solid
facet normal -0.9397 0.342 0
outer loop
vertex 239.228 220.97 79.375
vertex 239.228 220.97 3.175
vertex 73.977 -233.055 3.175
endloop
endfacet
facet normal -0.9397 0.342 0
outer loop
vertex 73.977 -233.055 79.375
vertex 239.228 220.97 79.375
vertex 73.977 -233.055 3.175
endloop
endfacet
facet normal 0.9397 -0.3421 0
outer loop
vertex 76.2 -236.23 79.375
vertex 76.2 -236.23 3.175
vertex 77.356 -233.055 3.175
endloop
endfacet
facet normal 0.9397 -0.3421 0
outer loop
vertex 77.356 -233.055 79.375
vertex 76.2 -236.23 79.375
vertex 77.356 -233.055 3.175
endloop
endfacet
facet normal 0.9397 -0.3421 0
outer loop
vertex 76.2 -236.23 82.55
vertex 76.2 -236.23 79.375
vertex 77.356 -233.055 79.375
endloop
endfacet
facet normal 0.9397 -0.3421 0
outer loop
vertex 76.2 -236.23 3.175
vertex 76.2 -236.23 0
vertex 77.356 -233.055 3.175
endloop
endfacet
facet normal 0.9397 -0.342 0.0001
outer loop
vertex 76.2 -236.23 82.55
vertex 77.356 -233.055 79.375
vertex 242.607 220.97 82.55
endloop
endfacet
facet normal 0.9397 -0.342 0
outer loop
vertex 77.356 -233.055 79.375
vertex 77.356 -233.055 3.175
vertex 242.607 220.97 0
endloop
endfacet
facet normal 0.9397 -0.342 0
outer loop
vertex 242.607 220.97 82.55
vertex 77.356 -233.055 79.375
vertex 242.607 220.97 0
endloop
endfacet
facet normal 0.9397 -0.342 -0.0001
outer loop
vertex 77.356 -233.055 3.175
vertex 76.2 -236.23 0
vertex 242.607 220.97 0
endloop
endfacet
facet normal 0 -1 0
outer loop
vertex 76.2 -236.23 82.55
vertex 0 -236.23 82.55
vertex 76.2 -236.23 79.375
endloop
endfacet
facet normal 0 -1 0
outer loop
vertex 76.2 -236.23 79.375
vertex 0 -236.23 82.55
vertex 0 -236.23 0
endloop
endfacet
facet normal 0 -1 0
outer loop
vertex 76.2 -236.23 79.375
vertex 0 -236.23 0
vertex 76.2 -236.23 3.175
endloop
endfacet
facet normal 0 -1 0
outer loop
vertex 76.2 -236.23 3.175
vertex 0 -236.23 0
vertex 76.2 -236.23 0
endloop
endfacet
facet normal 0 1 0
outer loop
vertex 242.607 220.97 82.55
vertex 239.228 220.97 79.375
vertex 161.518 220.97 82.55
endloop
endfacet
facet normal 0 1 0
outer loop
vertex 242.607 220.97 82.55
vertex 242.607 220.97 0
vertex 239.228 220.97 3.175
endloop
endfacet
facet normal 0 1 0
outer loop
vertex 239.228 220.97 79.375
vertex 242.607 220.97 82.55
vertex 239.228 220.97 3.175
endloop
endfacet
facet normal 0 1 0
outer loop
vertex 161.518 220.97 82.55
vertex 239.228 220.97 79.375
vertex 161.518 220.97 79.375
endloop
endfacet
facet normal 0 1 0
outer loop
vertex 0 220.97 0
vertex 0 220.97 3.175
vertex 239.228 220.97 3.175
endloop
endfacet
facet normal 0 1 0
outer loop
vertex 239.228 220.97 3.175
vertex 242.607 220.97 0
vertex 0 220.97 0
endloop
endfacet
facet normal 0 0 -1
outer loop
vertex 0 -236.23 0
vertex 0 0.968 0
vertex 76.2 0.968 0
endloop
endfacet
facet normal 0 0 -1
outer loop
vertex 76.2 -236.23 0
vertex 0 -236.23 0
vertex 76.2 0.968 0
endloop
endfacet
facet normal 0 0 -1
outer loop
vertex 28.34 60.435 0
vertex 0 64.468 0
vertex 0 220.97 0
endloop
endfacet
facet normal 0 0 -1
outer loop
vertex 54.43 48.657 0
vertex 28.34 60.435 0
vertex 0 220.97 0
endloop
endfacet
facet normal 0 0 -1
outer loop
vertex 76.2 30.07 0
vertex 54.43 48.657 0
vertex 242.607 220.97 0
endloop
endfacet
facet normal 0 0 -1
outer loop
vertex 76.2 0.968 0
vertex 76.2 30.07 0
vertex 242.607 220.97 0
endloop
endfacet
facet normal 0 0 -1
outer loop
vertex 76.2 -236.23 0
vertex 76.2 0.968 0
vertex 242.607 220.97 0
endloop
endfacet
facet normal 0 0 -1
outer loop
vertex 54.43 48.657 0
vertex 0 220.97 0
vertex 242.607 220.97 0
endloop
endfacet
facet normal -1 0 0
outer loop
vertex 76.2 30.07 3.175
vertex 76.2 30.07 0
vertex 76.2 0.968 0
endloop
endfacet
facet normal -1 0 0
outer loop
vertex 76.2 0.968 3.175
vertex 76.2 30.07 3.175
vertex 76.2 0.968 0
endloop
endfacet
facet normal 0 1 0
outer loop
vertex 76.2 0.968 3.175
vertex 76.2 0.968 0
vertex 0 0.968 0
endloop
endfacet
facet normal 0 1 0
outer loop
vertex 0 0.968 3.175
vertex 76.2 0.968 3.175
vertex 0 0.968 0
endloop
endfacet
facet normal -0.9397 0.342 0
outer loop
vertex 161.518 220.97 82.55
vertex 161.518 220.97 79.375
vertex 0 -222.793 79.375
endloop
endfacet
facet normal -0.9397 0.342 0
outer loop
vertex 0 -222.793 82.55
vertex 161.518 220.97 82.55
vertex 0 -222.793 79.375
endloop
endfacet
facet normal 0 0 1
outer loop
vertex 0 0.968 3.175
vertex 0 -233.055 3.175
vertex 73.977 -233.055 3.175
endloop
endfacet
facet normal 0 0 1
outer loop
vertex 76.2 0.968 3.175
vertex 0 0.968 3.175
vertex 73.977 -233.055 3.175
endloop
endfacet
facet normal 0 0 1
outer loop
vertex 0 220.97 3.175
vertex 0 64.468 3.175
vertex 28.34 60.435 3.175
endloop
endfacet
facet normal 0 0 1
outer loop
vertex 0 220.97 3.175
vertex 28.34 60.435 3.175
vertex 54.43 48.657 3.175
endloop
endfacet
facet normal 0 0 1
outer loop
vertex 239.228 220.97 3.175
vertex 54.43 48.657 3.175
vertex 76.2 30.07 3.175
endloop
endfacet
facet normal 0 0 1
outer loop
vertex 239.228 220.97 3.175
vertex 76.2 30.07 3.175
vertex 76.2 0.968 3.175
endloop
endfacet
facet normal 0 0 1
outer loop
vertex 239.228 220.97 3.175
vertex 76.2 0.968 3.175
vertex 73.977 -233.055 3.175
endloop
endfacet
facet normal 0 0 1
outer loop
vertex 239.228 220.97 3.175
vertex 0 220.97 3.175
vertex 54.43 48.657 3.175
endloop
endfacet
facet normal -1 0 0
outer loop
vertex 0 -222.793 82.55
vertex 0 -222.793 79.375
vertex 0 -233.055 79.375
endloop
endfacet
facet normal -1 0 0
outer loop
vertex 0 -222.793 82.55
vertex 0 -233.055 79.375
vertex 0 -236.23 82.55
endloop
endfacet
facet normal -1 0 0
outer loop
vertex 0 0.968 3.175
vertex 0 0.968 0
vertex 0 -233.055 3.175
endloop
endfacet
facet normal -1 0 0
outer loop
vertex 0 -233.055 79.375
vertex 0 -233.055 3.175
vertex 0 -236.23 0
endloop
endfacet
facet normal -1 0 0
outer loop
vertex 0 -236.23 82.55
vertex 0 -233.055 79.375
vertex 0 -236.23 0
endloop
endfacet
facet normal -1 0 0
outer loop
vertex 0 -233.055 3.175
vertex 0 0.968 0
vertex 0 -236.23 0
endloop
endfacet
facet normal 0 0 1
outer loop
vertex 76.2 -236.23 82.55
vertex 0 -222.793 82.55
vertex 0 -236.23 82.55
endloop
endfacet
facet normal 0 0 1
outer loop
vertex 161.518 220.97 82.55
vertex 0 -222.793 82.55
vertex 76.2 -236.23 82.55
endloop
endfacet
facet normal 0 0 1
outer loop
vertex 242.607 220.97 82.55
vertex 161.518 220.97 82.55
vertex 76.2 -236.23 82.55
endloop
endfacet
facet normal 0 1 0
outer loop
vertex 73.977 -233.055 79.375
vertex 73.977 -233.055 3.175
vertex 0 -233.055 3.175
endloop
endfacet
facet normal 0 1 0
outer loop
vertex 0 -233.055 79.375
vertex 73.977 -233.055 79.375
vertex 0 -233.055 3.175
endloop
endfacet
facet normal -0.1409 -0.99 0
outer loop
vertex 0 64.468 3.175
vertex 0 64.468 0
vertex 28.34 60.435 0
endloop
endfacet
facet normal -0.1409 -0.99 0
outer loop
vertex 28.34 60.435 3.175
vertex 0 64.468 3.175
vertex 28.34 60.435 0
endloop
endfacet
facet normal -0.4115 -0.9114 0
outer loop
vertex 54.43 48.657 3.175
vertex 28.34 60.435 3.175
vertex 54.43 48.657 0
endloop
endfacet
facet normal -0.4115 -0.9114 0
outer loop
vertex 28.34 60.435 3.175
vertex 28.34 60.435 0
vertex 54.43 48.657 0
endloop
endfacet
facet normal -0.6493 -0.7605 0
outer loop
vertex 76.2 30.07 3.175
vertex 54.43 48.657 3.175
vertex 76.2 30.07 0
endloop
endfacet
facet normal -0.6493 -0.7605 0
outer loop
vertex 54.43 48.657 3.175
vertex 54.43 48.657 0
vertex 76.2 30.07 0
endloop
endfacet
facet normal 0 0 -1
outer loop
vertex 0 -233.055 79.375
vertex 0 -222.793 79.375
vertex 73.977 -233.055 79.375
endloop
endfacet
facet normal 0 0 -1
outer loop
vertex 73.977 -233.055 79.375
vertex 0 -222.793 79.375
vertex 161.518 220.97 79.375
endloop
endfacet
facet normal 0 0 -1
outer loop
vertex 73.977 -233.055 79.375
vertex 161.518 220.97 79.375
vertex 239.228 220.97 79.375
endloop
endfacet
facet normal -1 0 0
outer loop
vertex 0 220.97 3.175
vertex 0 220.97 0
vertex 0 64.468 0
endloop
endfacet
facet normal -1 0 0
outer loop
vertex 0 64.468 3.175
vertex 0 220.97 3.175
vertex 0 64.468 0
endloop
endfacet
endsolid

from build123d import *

# Parameters (mm, degrees)
F1_DEPTH = 3.175
F3_DEPTH = 76.2
F5_DEPTH = 3.175


with BuildPart() as f1:
    # F0 (on Top) → F1 (new body)
    with BuildSketch(Plane.XY):
        with BuildLine():
            ThreePointArc((0, 152.4), (23.5583821583, 150.5681328505), (46.5504148891, 145.1165699486))
            Line((46.5504148891, 145.1165699486), (76.2, 145.1165699486))
            Line((76.2, 145.1165699486), (76.2, 220.9699887776))
            Line((76.2, 220.9699887776), (0, 220.9699887776))
            Line((0, 220.9699887776), (0, 152.4))
        make_face()
        with BuildLine():
            Line((0, 145.1165699486), (46.5504148891, 145.1165699486))
            ThreePointArc((46.5504148891, 145.1165699486), (23.5583821583, 150.5681328505), (0, 152.4))
            Line((0, 152.4), (0, 145.1165699486))
        make_face()
        with BuildLine():
            Line((76.2, 79.9558987255), (76.2, 131.9822715367))
            ThreePointArc((76.2, 131.9822715367), (61.7255501195, 139.3402901621), (46.5504148891, 145.1165699486))
            Line((46.5504148891, 145.1165699486), (0, 145.1165699486))
            Line((0, 145.1165699486), (0, 102.5676841179))
            ThreePointArc((0, 102.5676841179), (39.7420836099, 96.795488514), (76.2, 79.9558987255))
        make_face()
        with BuildLine():
            Line((76.2, 30.069767419), (76.2, 79.9558987255))
            ThreePointArc((76.2, 79.9558987255), (39.7420836099, 96.795488514), (0, 102.5676841179))
            Line((0, 102.5676841179), (0, 64.4676841179))
            ThreePointArc((0, 64.4676841179), (41.802083301, 55.469767419), (76.2, 30.069767419))
        make_face()
        with BuildLine():
            ThreePointArc((134.4041666021, 0.9676841179), (112.4647200648, 45.7397345375), (76.2, 79.9558987255))
            Line((76.2, 79.9558987255), (76.2, 30.069767419))
            ThreePointArc((76.2, 30.069767419), (86.426594721, 16.2812004311), (94.1857207861, 0.9676841179))
            Line((94.1857207861, 0.9676841179), (134.4041666021, 0.9676841179))
        make_face()
        with BuildLine():
            ThreePointArc((94.1857207861, 0.9676841179), (86.426594721, 16.2812004311), (76.2, 30.069767419))
            Line((76.2, 30.069767419), (76.2, 0.9676841179))
            Line((76.2, 0.9676841179), (94.1857207861, 0.9676841179))
        make_face()
        with BuildLine():
            Line((94.1857207861, 0.9676841179), (76.2, 0.9676841179))
            Line((76.2, 0.9676841179), (76.2, -104.3343991831))
            ThreePointArc((76.2, -104.3343991831), (95.0380976241, -73.0533403663), (101.6, -37.1323158821))
            ThreePointArc((101.6, -37.1323158821), (99.7292064339, -17.7249620165), (94.1857207861, 0.9676841179))
        make_face()
        with BuildLine():
            ThreePointArc((0, -152.4), (39.4440224736, -147.2070959265), (76.2, -131.9822715367))
            Line((76.2, -131.9822715367), (76.2, -104.3343991831))
            ThreePointArc((76.2, -104.3343991831), (41.802083301, -129.7343991831), (0, -138.7323158821))
            Line((0, -138.7323158821), (0, -152.4))
        make_face()
        with BuildLine():
            Line((76.2, -104.3343991831), (76.2, 0.9676841179))
            Line((76.2, 0.9676841179), (0, 0.9676841179))
            Line((0, 0.9676841179), (0, -138.7323158821))
            ThreePointArc((0, -138.7323158821), (41.802083301, -129.7343991831), (76.2, -104.3343991831))
        make_face()
        with BuildLine():
            Line((76.2, -154.2205304897), (76.2, -131.9822715367))
            ThreePointArc((76.2, -131.9822715367), (39.4440224736, -147.2070959265), (0, -152.4))
            Line((0, -152.4), (0, -166.4440847683))
            Line((0, -166.4440847683), (52.8635642719, -166.4440847683))
            ThreePointArc((52.8635642719, -166.4440847683), (64.8205578921, -160.8836200148), (76.2, -154.2205304897))
        make_face()
        with BuildLine():
            Line((0, -236.2300112224), (76.2, -236.2300112224))
            Line((76.2, -236.2300112224), (76.2, -166.4440847683))
            Line((76.2, -166.4440847683), (52.8635642719, -166.4440847683))
            ThreePointArc((52.8635642719, -166.4440847683), (26.9372965106, -174.2106586525), (0, -176.8323158821))
            Line((0, -176.8323158821), (0, -236.2300112224))
        make_face()
        Polygon((76.2, -236.2300112224), (101.6, -166.4440847683), (76.2, -166.4440847683), align=None)
        with BuildLine():
            Line((76.2, -166.4440847683), (76.2, -154.2205304897))
            ThreePointArc((76.2, -154.2205304897), (64.8205578921, -160.8836200148), (52.8635642719, -166.4440847683))
            Line((52.8635642719, -166.4440847683), (76.2, -166.4440847683))
        make_face()
        with BuildLine():
            ThreePointArc((0, -176.8323158821), (26.9372965106, -174.2106586525), (52.8635642719, -166.4440847683))
            Line((52.8635642719, -166.4440847683), (0, -166.4440847683))
            Line((0, -166.4440847683), (0, -176.8323158821))
        make_face()
        with BuildLine():
            Line((101.6, -166.4440847683), (131.2750589092, -84.9125304942))
            ThreePointArc((131.2750589092, -84.9125304942), (109.372641612, -124.0444281957), (76.2, -154.2205304897))
            Line((76.2, -154.2205304897), (76.2, -166.4440847683))
            Line((76.2, -166.4440847683), (101.6, -166.4440847683))
        make_face()
        with BuildLine():
            ThreePointArc((131.2750589092, -84.9125304942), (133.9529126579, -76.7896883426), (136.1286754731, -68.5181998738))
            ThreePointArc((136.1286754731, -68.5181998738), (110.8051835658, -104.6325537056), (76.2, -131.9822715367))
            Line((76.2, -131.9822715367), (76.2, -154.2205304897))
            ThreePointArc((76.2, -154.2205304897), (109.372641612, -124.0444281957), (131.2750589092, -84.9125304942))
        make_face()
        with BuildLine():
            ThreePointArc((76.2, -131.9822715367), (110.8051835658, -104.6325537056), (136.1286754731, -68.5181998738))
            ThreePointArc((136.1286754731, -68.5181998738), (138.8042974183, -52.9265242574), (139.7, -37.1323158821))
            ThreePointArc((139.7, -37.1323158821), (138.3697078018, -17.8991683798), (134.4041666021, 0.9676841179))
            Line((134.4041666021, 0.9676841179), (94.1857207861, 0.9676841179))
            ThreePointArc((94.1857207861, 0.9676841179), (99.7292064339, -17.7249620165), (101.6, -37.1323158821))
            ThreePointArc((101.6, -37.1323158821), (95.0380976241, -73.0533403663), (76.2, -104.3343991831))
            Line((76.2, -104.3343991831), (76.2, -131.9822715367))
        make_face()
        with BuildLine():
            ThreePointArc((143.2091555839, -52.1238693589), (150.0847016038, -26.4639820229), (152.4, 0))
            ThreePointArc((152.4, 0), (131.9822715367, 76.2), (76.2, 131.9822715367))
            Line((76.2, 131.9822715367), (76.2, 79.9558987255))
            ThreePointArc((76.2, 79.9558987255), (112.4647200648, 45.7397345375), (134.4041666021, 0.9676841179))
            ThreePointArc((134.4041666021, 0.9676841179), (138.3697078018, -17.8991683798), (139.7, -37.1323158821))
            ThreePointArc((139.7, -37.1323158821), (138.8042974183, -52.9265242574), (136.1286754731, -68.5181998738))
            ThreePointArc((136.1286754731, -68.5181998738), (139.9092544586, -60.4248336103), (143.2091555839, -52.1238693589))
        make_face()
        with BuildLine():
            ThreePointArc((76.2, 131.9822715367), (131.9822715367, 76.2), (152.4, 0))
            ThreePointArc((152.4, 0), (150.0847016038, -26.4639820229), (143.2091555839, -52.1238693589))
            Line((143.2091555839, -52.1238693589), (242.6071911065, 220.9699887776))
            Line((242.6071911065, 220.9699887776), (76.2, 145.1165699486))
            Line((76.2, 145.1165699486), (76.2, 131.9822715367))
        make_face()
        with BuildLine():
            ThreePointArc((46.5504148891, 145.1165699486), (61.7255501195, 139.3402901621), (76.2, 131.9822715367))
            Line((76.2, 131.9822715367), (76.2, 145.1165699486))
            Line((76.2, 145.1165699486), (46.5504148891, 145.1165699486))
        make_face()
        Polygon((76.2, 220.9699887776), (76.2, 145.1165699486), (242.6071911065, 220.9699887776), align=None)
        with BuildLine():
            Line((131.2750589092, -84.9125304942), (143.2091555839, -52.1238693589))
            ThreePointArc((143.2091555839, -52.1238693589), (139.9092544586, -60.4248336103), (136.1286754731, -68.5181998738))
            ThreePointArc((136.1286754731, -68.5181998738), (133.9529126579, -76.7896883426), (131.2750589092, -84.9125304942))
        make_face()
    extrude(amount=F1_DEPTH)

    # F2 (on face) → F3 (join)
    with BuildSketch(Plane.XY.offset(3.175)):
        Polygon((242.6071911065, 220.9699887776), (239.2284266789, 220.9699887776), (73.9768410662, -233.0550112224), (77.3556054938, -233.0550112224), align=None)
        Polygon((77.3556054938, -233.0550112224), (73.9768410662, -233.0550112224), (72.8212355724, -236.2300112224), (76.2, -236.2300112224), align=None)
        Polygon((72.8212355724, -236.2300112224), (73.9768410662, -233.0550112224), (0, -233.0550112224), (0, -236.2300112224), align=None)
    extrude(amount=F3_DEPTH)

    # F4 (on face) → F5 (join)
    with BuildSketch(Plane.XY.offset(79.375)):
        Polygon((239.2284266789, 220.9699887776), (161.5176911065, 220.9699887776), (0, -222.7934112224), (0, -233.0550112224), (73.9768410662, -233.0550112224), align=None)
        Polygon((242.6071911065, 220.9699887776), (239.2284266789, 220.9699887776), (73.9768410662, -233.0550112224), (0, -233.0550112224), (0, -236.2300112224), (76.2, -236.2300112224), align=None)
    extrude(amount=F5_DEPTH)


solid = f1.part
